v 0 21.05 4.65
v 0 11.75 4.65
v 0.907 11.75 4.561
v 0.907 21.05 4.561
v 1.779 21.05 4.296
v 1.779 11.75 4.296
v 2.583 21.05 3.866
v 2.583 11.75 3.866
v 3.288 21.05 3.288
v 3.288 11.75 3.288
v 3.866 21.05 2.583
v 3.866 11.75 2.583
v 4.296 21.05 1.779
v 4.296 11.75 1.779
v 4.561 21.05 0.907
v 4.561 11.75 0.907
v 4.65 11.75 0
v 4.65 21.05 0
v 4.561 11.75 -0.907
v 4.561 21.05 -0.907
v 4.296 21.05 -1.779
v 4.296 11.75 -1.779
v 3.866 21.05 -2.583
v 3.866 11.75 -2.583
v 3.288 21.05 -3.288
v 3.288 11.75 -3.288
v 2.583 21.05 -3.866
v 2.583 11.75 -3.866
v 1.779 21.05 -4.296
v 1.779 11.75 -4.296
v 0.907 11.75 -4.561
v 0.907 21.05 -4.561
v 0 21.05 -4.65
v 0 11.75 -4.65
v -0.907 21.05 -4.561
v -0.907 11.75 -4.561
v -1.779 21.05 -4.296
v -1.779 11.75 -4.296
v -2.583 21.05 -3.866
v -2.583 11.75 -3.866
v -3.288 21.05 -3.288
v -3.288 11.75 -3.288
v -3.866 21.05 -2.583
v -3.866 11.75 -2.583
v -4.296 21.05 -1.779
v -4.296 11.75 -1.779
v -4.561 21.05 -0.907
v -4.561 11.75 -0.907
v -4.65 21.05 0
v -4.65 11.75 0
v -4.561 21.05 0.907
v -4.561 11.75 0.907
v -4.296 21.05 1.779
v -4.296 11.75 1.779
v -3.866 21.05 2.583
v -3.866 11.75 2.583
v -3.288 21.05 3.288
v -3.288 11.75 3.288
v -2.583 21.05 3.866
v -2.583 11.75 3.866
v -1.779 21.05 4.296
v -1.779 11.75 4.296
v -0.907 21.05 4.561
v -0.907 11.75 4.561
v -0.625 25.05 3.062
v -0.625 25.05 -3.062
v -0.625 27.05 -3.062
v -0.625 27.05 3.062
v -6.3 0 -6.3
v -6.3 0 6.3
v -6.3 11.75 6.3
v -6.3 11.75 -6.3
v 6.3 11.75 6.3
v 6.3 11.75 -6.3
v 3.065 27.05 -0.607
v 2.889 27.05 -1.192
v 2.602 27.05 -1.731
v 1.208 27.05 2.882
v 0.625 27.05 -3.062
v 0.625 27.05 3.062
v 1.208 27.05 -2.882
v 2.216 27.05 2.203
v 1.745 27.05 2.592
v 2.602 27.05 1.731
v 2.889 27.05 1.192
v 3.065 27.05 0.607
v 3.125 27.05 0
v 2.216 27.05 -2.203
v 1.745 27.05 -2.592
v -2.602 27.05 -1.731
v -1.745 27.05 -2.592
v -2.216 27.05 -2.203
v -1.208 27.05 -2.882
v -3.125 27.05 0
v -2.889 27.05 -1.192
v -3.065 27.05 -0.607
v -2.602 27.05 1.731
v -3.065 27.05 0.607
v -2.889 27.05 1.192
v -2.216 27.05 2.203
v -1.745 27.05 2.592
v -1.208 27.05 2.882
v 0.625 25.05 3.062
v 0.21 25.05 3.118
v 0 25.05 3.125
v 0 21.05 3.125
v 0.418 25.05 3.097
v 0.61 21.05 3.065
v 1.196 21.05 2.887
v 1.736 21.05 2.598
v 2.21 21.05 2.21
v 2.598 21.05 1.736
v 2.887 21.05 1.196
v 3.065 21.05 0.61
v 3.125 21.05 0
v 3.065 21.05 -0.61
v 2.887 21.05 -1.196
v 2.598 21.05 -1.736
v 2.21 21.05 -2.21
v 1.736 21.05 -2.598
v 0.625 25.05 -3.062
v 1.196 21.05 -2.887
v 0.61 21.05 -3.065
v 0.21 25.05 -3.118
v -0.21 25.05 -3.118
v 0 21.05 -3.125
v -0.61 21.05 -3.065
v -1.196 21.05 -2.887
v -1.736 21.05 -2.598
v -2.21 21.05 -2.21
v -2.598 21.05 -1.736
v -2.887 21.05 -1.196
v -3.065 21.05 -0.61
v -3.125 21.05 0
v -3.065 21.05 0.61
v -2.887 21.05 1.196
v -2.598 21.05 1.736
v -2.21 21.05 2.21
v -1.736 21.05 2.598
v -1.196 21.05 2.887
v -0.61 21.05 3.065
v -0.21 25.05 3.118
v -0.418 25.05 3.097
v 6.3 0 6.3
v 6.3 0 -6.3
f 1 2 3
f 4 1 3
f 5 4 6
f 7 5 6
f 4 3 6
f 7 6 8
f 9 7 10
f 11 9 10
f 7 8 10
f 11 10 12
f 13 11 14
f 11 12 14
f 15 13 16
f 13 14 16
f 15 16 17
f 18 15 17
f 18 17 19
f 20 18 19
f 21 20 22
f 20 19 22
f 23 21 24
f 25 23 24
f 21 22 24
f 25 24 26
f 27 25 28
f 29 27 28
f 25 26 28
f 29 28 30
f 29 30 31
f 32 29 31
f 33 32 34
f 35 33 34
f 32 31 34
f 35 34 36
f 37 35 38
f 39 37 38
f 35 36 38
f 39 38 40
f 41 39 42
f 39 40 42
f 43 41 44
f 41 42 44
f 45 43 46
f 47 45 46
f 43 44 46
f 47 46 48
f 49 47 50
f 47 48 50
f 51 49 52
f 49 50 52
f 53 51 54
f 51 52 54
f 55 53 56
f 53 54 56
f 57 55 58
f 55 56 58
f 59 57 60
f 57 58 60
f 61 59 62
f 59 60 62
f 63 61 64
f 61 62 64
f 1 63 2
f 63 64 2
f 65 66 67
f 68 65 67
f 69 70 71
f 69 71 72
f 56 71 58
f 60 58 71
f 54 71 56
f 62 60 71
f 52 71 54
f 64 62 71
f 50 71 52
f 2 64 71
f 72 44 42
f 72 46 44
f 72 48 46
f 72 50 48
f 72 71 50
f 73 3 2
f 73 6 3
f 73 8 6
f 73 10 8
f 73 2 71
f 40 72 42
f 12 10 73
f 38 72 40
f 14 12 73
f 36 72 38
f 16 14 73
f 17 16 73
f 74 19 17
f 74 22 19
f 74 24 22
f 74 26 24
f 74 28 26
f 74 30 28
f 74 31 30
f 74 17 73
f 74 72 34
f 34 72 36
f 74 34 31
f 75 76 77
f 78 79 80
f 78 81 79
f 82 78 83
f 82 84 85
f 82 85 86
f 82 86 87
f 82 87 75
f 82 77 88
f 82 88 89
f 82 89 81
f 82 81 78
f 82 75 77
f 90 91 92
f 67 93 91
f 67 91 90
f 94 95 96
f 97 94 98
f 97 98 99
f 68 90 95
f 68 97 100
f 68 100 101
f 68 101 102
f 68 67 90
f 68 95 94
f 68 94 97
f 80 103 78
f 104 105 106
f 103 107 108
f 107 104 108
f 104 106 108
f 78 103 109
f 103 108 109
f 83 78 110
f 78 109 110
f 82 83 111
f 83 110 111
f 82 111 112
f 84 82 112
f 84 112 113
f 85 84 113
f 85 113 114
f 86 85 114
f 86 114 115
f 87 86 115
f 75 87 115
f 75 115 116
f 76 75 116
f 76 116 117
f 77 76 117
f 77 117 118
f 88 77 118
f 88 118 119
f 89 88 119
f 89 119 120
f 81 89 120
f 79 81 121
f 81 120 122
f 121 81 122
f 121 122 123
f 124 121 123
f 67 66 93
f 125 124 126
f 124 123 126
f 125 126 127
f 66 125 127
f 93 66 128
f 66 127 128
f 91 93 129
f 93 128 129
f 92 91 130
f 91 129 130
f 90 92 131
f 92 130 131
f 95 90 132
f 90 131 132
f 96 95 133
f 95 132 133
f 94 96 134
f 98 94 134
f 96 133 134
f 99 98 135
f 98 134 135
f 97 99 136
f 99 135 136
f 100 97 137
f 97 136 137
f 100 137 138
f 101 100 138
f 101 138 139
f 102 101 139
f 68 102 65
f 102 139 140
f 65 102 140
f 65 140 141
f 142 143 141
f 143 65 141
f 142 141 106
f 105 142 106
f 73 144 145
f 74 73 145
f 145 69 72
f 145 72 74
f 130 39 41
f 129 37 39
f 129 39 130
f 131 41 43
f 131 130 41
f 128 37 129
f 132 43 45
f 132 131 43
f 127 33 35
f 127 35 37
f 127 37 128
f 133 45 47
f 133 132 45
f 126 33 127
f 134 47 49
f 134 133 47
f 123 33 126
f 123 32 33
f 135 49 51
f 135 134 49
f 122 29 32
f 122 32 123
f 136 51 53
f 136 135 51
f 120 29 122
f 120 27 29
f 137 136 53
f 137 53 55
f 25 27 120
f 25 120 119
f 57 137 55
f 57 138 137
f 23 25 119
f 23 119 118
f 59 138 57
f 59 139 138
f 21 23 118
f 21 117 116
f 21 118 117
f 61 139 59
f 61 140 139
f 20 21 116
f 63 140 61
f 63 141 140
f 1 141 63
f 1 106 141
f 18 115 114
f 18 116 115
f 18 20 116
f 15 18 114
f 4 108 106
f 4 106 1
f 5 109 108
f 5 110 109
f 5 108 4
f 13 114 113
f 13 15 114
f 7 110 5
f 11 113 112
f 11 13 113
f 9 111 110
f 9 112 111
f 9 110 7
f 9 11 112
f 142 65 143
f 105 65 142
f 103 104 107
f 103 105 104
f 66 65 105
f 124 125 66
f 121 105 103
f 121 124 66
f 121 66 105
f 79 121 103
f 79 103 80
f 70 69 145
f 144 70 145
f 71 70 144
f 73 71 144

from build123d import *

# Parameters (mm, degrees)
SKETCH1_W               = 12.6
SKETCH1_H               = 12.6
BOSS_EXTRUDE1_DEPTH     = 11.75
SKETCH2_R               = 4.65
BOSS_EXTRUDE2_DEPTH     = 9.3
SKETCH3_R               = 3.125
BOSS_EXTRUDE3_DEPTH     = 6
CUT_EXTRUDE1_DEPTH      = 29.479510178
CUT_EXTRUDE1_DEPTH_BACK = 29.479510178
SKETCH4_W               = 1.25
SKETCH4_H               = 2


with BuildPart() as part:
    # Sketch1 → Boss-Extrude1 (new body)
    with BuildSketch(Plane(origin=(0, 0, 0), x_dir=(1, 0, 0), z_dir=(0, 1, 0))):
        Rectangle(SKETCH1_W, SKETCH1_H)
    extrude(amount=BOSS_EXTRUDE1_DEPTH)

    # Sketch2 → Boss-Extrude2 (add)
    with BuildSketch(Plane(origin=(0, 11.75, 0), x_dir=(1, 0, 0), z_dir=(0, 1, 0))):
        with Locations(Location((0, 0, 0), (0, 0, 270))):
            Circle(SKETCH2_R)
    extrude(amount=BOSS_EXTRUDE2_DEPTH)

    # Sketch3 → Boss-Extrude3 (add)
    with BuildSketch(Plane(origin=(0, 21.05, 0), x_dir=(1, 0, 0), z_dir=(0, 1, 0))):
        with Locations(Location((0, 0, 0), (0, 0, 270))):
            Circle(SKETCH3_R)
    extrude(amount=BOSS_EXTRUDE3_DEPTH)

    # Sketch4 → Cut-Extrude1 (cut, two sides: drawn at the far end of the back side and taken through both)
    with BuildSketch(Plane.XY.offset(-CUT_EXTRUDE1_DEPTH_BACK)):
        with Locations((0, 26.05)):
            Rectangle(SKETCH4_W, SKETCH4_H)
    extrude(amount=CUT_EXTRUDE1_DEPTH + CUT_EXTRUDE1_DEPTH_BACK, mode=Mode.SUBTRACT)


solid = part.part
